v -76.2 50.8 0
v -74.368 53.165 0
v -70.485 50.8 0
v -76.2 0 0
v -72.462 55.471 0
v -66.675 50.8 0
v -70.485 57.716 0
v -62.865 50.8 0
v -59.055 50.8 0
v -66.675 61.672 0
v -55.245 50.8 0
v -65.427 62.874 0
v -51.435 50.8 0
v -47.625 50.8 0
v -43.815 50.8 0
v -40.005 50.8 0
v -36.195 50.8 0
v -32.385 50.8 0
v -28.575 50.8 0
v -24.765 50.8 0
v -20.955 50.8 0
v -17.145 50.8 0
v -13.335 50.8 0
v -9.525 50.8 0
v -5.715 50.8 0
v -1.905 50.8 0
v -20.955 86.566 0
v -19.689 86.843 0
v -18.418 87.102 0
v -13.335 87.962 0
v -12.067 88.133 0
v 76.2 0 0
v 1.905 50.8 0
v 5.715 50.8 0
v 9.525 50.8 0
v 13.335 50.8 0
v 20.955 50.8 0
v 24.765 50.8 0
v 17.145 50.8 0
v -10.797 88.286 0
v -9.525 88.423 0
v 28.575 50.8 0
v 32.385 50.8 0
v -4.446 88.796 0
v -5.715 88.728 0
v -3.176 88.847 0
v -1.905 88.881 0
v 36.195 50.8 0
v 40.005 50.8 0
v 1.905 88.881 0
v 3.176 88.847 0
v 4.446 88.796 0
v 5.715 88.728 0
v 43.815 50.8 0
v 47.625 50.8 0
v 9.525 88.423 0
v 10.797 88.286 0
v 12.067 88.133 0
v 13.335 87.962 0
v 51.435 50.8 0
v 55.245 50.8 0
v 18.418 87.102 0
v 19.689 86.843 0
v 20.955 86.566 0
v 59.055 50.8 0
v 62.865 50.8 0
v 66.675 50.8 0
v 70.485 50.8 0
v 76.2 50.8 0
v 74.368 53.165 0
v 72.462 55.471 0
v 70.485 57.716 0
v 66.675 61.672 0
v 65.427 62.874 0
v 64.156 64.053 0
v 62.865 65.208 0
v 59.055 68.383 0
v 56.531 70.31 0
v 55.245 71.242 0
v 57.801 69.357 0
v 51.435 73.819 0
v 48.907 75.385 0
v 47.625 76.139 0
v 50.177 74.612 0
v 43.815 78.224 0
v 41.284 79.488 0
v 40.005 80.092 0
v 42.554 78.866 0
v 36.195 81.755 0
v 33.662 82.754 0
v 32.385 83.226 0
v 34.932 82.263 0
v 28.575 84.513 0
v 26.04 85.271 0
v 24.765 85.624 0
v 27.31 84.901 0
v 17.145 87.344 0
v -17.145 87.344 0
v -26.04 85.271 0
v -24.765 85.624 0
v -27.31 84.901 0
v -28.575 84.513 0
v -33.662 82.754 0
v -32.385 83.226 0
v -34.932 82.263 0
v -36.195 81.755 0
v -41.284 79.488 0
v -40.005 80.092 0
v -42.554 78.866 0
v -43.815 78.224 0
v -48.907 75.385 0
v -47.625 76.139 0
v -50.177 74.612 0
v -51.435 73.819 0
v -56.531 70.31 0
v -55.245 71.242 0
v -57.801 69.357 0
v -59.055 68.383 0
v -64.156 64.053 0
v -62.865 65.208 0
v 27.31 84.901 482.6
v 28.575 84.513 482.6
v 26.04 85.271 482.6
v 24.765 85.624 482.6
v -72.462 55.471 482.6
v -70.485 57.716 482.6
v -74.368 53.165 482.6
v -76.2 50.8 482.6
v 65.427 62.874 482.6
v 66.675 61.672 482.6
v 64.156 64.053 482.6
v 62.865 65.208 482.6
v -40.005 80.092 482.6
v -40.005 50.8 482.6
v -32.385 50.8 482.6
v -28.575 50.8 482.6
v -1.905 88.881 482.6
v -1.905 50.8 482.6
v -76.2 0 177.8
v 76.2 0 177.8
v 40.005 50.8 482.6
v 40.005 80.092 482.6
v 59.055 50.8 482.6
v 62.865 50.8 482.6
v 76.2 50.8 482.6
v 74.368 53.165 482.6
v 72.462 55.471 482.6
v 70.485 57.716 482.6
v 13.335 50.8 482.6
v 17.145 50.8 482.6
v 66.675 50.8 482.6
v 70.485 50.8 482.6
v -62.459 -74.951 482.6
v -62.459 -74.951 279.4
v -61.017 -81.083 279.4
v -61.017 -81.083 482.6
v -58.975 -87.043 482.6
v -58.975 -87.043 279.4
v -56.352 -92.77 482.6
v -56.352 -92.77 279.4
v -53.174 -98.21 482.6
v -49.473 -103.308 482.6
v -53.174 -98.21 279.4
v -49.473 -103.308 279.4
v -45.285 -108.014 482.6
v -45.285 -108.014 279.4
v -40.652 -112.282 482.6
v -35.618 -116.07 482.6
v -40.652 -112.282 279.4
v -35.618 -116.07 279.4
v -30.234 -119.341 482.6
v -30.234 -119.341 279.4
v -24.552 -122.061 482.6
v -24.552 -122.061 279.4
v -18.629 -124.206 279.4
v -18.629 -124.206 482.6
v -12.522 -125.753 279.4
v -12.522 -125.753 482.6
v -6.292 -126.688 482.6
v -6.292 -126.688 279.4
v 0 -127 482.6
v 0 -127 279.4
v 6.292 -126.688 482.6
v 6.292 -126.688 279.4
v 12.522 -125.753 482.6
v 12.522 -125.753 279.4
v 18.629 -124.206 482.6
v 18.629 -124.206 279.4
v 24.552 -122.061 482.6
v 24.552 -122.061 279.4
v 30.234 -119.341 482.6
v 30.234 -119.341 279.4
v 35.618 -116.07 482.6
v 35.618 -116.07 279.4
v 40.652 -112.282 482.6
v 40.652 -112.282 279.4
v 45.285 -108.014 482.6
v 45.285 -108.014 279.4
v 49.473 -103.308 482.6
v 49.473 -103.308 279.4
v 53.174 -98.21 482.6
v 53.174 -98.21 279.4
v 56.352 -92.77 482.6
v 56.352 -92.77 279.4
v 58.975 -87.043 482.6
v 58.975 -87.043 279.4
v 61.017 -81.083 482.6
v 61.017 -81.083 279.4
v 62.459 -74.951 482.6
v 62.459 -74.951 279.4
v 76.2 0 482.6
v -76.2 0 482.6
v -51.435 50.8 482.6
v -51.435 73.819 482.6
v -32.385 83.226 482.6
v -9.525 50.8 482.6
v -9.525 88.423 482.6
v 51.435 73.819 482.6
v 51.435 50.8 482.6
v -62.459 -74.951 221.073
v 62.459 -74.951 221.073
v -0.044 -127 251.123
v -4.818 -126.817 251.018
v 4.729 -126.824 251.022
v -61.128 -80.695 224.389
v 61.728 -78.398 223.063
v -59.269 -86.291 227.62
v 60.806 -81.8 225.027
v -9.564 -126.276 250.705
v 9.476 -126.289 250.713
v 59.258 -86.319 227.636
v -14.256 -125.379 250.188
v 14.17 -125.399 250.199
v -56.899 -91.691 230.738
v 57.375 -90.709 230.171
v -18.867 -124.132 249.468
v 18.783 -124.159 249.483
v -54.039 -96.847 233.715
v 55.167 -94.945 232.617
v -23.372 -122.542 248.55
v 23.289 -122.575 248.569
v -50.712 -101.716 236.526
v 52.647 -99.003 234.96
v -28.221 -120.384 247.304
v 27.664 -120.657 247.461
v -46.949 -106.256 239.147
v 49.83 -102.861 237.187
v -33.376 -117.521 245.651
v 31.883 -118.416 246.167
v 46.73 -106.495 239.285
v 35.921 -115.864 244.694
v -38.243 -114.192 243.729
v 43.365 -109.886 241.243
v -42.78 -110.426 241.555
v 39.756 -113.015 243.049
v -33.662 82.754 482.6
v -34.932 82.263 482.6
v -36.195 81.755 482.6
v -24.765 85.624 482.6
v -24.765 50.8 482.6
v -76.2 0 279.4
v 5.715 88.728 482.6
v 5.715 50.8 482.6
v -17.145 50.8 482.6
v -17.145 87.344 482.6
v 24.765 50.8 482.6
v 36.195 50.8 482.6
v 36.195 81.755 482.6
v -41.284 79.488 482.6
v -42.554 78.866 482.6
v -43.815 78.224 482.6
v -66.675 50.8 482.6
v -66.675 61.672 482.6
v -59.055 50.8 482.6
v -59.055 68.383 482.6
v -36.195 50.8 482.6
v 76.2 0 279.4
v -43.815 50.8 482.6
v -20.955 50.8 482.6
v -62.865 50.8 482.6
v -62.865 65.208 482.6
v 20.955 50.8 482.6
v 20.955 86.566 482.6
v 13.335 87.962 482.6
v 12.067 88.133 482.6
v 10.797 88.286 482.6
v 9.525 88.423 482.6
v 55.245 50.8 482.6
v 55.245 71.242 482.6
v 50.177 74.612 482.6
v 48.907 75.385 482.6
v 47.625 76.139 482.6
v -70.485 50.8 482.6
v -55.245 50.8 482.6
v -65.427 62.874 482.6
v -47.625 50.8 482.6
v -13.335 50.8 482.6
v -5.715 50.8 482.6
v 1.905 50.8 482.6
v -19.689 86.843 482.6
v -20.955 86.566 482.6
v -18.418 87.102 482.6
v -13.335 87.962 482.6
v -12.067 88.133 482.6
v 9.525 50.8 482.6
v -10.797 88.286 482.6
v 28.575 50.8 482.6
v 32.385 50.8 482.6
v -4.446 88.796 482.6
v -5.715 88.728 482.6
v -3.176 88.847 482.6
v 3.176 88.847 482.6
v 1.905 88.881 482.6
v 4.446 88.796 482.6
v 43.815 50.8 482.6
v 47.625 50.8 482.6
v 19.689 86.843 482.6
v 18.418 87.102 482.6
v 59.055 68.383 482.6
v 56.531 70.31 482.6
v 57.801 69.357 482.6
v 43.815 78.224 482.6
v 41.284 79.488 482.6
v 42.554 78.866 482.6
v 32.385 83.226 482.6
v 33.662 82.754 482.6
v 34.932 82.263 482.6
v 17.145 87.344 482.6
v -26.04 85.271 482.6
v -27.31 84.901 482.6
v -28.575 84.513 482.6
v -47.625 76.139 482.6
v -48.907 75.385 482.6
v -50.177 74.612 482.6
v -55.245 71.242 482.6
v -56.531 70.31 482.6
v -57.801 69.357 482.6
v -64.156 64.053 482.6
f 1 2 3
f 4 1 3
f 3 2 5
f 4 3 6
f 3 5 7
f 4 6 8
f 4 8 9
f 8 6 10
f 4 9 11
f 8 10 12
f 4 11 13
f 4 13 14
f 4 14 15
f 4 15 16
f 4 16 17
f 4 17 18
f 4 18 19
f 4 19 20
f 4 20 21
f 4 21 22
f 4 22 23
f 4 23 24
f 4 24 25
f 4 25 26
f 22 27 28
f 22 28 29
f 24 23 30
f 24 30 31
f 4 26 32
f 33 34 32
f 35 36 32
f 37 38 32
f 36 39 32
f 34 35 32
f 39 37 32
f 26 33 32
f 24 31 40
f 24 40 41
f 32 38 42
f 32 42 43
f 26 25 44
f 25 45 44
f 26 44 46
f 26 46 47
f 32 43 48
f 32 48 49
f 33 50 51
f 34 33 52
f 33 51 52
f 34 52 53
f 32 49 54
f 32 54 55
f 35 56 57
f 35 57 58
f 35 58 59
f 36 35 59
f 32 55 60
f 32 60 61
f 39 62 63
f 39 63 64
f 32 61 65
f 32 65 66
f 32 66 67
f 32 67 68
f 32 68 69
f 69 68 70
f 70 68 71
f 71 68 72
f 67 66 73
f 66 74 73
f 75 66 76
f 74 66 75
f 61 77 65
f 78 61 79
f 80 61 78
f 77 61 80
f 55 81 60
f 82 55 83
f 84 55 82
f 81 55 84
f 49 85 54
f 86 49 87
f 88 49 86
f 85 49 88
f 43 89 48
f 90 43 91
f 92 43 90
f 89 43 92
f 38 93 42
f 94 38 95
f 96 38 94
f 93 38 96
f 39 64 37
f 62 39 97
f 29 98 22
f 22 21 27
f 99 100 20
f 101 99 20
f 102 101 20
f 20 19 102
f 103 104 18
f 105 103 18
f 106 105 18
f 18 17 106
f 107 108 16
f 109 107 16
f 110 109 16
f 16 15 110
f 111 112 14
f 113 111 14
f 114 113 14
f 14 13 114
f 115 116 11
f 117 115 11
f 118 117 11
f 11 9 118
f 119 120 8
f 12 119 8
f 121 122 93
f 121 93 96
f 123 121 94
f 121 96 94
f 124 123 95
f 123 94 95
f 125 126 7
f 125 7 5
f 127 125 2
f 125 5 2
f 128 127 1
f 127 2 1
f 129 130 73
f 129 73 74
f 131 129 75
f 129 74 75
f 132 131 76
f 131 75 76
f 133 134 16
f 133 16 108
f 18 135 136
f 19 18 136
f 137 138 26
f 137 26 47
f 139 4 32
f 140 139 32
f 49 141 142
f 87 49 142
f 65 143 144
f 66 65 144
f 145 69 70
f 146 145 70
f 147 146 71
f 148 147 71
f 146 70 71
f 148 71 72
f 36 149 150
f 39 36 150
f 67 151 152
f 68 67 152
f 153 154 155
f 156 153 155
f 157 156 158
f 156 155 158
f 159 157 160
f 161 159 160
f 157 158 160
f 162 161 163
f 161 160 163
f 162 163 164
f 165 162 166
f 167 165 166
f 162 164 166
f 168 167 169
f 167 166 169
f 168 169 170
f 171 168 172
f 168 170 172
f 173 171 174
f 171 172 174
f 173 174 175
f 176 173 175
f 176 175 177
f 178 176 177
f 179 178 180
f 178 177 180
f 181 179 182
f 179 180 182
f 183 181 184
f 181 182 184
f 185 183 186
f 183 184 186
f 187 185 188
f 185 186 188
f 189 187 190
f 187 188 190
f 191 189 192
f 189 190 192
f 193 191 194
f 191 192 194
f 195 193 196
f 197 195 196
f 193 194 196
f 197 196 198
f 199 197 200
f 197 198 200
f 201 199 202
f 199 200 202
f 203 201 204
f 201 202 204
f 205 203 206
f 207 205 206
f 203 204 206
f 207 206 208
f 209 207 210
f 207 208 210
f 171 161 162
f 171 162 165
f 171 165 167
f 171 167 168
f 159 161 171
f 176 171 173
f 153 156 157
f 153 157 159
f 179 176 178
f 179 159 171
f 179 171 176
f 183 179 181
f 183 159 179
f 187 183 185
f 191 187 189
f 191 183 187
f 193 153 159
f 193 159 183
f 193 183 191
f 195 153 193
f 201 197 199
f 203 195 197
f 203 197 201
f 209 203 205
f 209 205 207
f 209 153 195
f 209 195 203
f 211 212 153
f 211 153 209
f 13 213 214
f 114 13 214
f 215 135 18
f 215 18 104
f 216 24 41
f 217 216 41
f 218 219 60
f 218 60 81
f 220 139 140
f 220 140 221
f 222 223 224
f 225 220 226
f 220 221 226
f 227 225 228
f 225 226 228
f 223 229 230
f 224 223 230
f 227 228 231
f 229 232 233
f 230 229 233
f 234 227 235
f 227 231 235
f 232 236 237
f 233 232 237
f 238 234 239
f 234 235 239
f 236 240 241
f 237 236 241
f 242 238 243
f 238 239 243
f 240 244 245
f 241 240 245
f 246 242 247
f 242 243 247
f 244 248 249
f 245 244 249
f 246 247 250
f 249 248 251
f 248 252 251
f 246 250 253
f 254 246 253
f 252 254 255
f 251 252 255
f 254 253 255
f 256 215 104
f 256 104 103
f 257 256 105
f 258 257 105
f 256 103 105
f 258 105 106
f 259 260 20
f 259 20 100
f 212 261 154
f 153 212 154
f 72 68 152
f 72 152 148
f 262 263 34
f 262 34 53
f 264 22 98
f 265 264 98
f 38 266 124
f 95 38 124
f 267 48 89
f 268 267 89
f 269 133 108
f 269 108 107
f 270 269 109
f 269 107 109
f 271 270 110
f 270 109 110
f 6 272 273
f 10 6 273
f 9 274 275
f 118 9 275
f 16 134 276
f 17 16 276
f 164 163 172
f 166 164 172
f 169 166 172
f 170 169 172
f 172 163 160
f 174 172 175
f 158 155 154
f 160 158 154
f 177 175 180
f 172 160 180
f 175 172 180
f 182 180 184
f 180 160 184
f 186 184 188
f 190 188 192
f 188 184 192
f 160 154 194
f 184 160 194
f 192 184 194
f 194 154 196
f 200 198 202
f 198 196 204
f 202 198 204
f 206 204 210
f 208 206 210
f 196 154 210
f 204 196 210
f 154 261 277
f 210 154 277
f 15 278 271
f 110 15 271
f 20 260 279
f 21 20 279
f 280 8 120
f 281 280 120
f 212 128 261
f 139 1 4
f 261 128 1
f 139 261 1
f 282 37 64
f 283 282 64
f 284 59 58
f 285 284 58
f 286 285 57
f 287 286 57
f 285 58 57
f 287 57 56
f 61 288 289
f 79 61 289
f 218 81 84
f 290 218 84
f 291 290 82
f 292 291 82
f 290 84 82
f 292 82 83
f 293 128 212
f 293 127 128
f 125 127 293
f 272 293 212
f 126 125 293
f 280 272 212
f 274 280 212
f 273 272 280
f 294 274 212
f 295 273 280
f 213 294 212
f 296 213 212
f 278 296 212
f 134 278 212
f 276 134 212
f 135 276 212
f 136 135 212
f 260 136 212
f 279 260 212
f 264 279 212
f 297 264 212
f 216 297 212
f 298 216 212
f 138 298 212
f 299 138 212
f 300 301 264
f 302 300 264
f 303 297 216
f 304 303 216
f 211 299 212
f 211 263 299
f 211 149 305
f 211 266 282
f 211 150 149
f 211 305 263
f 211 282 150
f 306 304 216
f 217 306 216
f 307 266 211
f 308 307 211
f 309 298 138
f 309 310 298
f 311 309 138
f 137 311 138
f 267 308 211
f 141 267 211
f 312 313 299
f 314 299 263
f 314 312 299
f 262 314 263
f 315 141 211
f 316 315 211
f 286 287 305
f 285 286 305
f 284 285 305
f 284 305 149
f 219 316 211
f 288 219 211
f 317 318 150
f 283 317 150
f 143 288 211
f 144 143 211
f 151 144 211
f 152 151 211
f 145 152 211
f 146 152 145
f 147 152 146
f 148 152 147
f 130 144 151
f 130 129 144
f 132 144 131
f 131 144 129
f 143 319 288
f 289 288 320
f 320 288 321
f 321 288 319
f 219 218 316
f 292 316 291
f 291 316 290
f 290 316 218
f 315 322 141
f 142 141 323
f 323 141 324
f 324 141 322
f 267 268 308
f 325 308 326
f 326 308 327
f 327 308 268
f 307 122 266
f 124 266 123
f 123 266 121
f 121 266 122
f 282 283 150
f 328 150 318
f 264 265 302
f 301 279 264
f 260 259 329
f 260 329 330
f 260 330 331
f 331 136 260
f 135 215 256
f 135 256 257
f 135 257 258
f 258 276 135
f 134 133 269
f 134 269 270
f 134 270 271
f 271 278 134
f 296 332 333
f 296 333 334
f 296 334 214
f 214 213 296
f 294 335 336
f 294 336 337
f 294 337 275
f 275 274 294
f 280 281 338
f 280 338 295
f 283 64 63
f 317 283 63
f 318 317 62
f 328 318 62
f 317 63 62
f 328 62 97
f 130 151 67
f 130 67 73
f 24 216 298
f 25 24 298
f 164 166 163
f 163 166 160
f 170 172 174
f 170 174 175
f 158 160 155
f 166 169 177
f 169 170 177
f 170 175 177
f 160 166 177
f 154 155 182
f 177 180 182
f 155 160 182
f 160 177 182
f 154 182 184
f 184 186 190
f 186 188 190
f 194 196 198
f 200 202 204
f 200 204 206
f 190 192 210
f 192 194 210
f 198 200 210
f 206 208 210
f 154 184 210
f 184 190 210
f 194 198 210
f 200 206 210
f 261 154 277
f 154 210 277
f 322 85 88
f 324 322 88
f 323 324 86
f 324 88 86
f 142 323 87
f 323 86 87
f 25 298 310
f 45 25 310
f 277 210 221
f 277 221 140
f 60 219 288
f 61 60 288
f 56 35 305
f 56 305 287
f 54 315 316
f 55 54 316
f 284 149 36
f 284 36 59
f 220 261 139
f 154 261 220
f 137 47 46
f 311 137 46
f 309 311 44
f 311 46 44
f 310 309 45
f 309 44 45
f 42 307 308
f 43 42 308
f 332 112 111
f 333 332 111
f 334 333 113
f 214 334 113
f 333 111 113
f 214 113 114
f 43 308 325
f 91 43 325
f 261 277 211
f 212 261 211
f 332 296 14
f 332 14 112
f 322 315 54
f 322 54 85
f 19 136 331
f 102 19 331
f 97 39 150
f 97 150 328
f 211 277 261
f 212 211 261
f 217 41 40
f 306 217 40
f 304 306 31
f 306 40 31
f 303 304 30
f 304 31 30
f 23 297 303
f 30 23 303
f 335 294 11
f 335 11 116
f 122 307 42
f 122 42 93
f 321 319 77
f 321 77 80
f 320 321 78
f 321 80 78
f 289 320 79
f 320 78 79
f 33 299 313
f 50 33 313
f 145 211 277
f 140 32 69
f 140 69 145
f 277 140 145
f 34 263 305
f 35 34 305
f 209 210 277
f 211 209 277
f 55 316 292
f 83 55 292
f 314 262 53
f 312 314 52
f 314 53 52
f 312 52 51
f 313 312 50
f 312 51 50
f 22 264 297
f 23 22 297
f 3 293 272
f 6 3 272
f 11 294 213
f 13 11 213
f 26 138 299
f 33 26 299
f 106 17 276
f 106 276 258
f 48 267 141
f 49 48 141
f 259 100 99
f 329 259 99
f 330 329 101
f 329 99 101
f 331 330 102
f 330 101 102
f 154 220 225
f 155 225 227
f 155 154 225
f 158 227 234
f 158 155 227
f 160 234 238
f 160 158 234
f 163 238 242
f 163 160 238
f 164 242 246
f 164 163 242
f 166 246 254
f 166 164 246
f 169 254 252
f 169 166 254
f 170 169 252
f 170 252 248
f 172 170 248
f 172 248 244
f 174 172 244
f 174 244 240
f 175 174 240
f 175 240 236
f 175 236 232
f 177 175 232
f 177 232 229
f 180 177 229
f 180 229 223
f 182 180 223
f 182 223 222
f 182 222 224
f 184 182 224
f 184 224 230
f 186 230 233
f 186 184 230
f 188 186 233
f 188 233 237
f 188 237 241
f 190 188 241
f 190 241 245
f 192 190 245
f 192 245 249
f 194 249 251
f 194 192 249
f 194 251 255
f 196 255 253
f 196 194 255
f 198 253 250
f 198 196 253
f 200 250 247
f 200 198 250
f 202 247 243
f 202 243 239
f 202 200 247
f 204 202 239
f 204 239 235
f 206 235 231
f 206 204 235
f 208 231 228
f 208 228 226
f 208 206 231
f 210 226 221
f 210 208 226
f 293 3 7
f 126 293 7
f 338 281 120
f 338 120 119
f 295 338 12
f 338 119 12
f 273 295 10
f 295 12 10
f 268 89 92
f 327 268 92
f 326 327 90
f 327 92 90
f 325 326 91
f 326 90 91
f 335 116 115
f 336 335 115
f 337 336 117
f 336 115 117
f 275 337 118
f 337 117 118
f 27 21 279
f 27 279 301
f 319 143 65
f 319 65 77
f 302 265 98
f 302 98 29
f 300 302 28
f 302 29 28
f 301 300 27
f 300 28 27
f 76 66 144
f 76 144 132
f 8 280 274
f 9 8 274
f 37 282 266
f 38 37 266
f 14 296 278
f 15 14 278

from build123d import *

# Parameters (mm, degrees)
F1_DEPTH = 482.6
F2_W     = 3.81
F2_H     = 38.1
F3_DEPTH = 482.6
F5_DEPTH = 304.8
F6_W     = 138.08032
F6_H     = 203.2
F7_DEPTH = 254
F9_DEPTH = 203.2


with BuildPart() as f1:
    # F0 (on Top) → F1 (new body)
    with BuildSketch(Plane.XY):
        with BuildLine():
            ThreePointArc((76.2, 50.8), (0, 88.9), (-76.2, 50.8))
            Line((-76.2, 50.8), (-76.2, 0))
            Line((-76.2, 0), (76.2, 0))
            Line((76.2, 0), (76.2, 50.8))
        make_face()
    extrude(amount=F1_DEPTH)

    # F2 (on face) → F3 (cut)
    with BuildSketch(Plane.XY.offset(482.6)):
        with Locations((0, 69.85)):
            Rectangle(F2_W, F2_H)
        with Locations((7.62, 69.85)):
            Rectangle(F2_W, F2_H)
        with Locations((15.24, 69.85)):
            Rectangle(F2_W, F2_H)
        with Locations((22.86, 69.85)):
            Rectangle(F2_W, F2_H)
        with Locations((30.48, 69.85)):
            Rectangle(F2_W, F2_H)
        with Locations((38.1, 69.85)):
            Rectangle(F2_W, F2_H)
        with Locations((45.72, 69.85)):
            Rectangle(F2_W, F2_H)
        with Locations((53.34, 69.85)):
            Rectangle(F2_W, F2_H)
        with Locations((60.96, 69.85)):
            Rectangle(F2_W, F2_H)
        with Locations((68.58, 69.85)):
            Rectangle(F2_W, F2_H)
        with Locations((-7.62, 69.85)):
            Rectangle(F2_W, F2_H)
        with Locations((-15.24, 69.85)):
            Rectangle(F2_W, F2_H)
        with Locations((-22.86, 69.85)):
            Rectangle(F2_W, F2_H)
        with Locations((-30.48, 69.85)):
            Rectangle(F2_W, F2_H)
        with Locations((-38.1, 69.85)):
            Rectangle(F2_W, F2_H)
        with Locations((-45.72, 69.85)):
            Rectangle(F2_W, F2_H)
        with Locations((-53.34, 69.85)):
            Rectangle(F2_W, F2_H)
        with Locations((-60.96, 69.85)):
            Rectangle(F2_W, F2_H)
        with Locations((-68.58, 69.85)):
            Rectangle(F2_W, F2_H)
    extrude(amount=-F3_DEPTH, mode=Mode.SUBTRACT)

    # F4 (on face) → F5 (join)
    with BuildSketch(Plane.XY.offset(482.6)):
        with BuildLine():
            ThreePointArc((0, 0), (-48.782051, -22.848291), (-62.459016, -74.95082))
            ThreePointArc((-62.459016, -74.95082), (0, -127), (62.459016, -74.95082))
            ThreePointArc((62.459016, -74.95082), (63.239219, -69.24902), (63.5, -63.5))
            ThreePointArc((63.5, -63.5), (44.901281, -18.598719), (0, 0))
        make_face()
        with BuildLine():
            Line((-76.2, 0), (-62.459016, -74.95082))
            ThreePointArc((-62.459016, -74.95082), (-48.782051, -22.848291), (0, 0))
            Line((0, 0), (-76.2, 0))
        make_face()
        with BuildLine():
            ThreePointArc((63.5, -63.5), (63.239219, -69.24902), (62.459016, -74.95082))
            Line((62.459016, -74.95082), (76.2, 0))
            Line((76.2, 0), (0, 0))
            ThreePointArc((0, 0), (44.901281, -18.598719), (63.5, -63.5))
        make_face()
    extrude(amount=-F5_DEPTH)

    # F6 (on face) → F7 (cut)
    with BuildSketch(Plane.YZ.offset(76.2)):
        Polygon((-138.08032, 177.8), (0, 177.8), (-138.08032, 257.52071), align=None)
        with Locations((-69.04016, 381)):
            Rectangle(F6_W, F6_H)
    extrude(amount=-F7_DEPTH, mode=Mode.SUBTRACT)


with BuildPart() as f9:
    # F8 (on face) → F9 (new body, through all)
    with BuildSketch(Plane.XY.offset(279.4)):
        with BuildLine():
            Line((76.2, 0), (-76.2, 0))
            Line((-76.2, 0), (-62.459016, -74.95082))
            ThreePointArc((-62.459016, -74.95082), (0, -127), (62.459016, -74.95082))
            Line((62.459016, -74.95082), (76.2, 0))
        make_face()
    extrude(amount=F9_DEPTH)


solid = Compound([f1.part, f9.part])
